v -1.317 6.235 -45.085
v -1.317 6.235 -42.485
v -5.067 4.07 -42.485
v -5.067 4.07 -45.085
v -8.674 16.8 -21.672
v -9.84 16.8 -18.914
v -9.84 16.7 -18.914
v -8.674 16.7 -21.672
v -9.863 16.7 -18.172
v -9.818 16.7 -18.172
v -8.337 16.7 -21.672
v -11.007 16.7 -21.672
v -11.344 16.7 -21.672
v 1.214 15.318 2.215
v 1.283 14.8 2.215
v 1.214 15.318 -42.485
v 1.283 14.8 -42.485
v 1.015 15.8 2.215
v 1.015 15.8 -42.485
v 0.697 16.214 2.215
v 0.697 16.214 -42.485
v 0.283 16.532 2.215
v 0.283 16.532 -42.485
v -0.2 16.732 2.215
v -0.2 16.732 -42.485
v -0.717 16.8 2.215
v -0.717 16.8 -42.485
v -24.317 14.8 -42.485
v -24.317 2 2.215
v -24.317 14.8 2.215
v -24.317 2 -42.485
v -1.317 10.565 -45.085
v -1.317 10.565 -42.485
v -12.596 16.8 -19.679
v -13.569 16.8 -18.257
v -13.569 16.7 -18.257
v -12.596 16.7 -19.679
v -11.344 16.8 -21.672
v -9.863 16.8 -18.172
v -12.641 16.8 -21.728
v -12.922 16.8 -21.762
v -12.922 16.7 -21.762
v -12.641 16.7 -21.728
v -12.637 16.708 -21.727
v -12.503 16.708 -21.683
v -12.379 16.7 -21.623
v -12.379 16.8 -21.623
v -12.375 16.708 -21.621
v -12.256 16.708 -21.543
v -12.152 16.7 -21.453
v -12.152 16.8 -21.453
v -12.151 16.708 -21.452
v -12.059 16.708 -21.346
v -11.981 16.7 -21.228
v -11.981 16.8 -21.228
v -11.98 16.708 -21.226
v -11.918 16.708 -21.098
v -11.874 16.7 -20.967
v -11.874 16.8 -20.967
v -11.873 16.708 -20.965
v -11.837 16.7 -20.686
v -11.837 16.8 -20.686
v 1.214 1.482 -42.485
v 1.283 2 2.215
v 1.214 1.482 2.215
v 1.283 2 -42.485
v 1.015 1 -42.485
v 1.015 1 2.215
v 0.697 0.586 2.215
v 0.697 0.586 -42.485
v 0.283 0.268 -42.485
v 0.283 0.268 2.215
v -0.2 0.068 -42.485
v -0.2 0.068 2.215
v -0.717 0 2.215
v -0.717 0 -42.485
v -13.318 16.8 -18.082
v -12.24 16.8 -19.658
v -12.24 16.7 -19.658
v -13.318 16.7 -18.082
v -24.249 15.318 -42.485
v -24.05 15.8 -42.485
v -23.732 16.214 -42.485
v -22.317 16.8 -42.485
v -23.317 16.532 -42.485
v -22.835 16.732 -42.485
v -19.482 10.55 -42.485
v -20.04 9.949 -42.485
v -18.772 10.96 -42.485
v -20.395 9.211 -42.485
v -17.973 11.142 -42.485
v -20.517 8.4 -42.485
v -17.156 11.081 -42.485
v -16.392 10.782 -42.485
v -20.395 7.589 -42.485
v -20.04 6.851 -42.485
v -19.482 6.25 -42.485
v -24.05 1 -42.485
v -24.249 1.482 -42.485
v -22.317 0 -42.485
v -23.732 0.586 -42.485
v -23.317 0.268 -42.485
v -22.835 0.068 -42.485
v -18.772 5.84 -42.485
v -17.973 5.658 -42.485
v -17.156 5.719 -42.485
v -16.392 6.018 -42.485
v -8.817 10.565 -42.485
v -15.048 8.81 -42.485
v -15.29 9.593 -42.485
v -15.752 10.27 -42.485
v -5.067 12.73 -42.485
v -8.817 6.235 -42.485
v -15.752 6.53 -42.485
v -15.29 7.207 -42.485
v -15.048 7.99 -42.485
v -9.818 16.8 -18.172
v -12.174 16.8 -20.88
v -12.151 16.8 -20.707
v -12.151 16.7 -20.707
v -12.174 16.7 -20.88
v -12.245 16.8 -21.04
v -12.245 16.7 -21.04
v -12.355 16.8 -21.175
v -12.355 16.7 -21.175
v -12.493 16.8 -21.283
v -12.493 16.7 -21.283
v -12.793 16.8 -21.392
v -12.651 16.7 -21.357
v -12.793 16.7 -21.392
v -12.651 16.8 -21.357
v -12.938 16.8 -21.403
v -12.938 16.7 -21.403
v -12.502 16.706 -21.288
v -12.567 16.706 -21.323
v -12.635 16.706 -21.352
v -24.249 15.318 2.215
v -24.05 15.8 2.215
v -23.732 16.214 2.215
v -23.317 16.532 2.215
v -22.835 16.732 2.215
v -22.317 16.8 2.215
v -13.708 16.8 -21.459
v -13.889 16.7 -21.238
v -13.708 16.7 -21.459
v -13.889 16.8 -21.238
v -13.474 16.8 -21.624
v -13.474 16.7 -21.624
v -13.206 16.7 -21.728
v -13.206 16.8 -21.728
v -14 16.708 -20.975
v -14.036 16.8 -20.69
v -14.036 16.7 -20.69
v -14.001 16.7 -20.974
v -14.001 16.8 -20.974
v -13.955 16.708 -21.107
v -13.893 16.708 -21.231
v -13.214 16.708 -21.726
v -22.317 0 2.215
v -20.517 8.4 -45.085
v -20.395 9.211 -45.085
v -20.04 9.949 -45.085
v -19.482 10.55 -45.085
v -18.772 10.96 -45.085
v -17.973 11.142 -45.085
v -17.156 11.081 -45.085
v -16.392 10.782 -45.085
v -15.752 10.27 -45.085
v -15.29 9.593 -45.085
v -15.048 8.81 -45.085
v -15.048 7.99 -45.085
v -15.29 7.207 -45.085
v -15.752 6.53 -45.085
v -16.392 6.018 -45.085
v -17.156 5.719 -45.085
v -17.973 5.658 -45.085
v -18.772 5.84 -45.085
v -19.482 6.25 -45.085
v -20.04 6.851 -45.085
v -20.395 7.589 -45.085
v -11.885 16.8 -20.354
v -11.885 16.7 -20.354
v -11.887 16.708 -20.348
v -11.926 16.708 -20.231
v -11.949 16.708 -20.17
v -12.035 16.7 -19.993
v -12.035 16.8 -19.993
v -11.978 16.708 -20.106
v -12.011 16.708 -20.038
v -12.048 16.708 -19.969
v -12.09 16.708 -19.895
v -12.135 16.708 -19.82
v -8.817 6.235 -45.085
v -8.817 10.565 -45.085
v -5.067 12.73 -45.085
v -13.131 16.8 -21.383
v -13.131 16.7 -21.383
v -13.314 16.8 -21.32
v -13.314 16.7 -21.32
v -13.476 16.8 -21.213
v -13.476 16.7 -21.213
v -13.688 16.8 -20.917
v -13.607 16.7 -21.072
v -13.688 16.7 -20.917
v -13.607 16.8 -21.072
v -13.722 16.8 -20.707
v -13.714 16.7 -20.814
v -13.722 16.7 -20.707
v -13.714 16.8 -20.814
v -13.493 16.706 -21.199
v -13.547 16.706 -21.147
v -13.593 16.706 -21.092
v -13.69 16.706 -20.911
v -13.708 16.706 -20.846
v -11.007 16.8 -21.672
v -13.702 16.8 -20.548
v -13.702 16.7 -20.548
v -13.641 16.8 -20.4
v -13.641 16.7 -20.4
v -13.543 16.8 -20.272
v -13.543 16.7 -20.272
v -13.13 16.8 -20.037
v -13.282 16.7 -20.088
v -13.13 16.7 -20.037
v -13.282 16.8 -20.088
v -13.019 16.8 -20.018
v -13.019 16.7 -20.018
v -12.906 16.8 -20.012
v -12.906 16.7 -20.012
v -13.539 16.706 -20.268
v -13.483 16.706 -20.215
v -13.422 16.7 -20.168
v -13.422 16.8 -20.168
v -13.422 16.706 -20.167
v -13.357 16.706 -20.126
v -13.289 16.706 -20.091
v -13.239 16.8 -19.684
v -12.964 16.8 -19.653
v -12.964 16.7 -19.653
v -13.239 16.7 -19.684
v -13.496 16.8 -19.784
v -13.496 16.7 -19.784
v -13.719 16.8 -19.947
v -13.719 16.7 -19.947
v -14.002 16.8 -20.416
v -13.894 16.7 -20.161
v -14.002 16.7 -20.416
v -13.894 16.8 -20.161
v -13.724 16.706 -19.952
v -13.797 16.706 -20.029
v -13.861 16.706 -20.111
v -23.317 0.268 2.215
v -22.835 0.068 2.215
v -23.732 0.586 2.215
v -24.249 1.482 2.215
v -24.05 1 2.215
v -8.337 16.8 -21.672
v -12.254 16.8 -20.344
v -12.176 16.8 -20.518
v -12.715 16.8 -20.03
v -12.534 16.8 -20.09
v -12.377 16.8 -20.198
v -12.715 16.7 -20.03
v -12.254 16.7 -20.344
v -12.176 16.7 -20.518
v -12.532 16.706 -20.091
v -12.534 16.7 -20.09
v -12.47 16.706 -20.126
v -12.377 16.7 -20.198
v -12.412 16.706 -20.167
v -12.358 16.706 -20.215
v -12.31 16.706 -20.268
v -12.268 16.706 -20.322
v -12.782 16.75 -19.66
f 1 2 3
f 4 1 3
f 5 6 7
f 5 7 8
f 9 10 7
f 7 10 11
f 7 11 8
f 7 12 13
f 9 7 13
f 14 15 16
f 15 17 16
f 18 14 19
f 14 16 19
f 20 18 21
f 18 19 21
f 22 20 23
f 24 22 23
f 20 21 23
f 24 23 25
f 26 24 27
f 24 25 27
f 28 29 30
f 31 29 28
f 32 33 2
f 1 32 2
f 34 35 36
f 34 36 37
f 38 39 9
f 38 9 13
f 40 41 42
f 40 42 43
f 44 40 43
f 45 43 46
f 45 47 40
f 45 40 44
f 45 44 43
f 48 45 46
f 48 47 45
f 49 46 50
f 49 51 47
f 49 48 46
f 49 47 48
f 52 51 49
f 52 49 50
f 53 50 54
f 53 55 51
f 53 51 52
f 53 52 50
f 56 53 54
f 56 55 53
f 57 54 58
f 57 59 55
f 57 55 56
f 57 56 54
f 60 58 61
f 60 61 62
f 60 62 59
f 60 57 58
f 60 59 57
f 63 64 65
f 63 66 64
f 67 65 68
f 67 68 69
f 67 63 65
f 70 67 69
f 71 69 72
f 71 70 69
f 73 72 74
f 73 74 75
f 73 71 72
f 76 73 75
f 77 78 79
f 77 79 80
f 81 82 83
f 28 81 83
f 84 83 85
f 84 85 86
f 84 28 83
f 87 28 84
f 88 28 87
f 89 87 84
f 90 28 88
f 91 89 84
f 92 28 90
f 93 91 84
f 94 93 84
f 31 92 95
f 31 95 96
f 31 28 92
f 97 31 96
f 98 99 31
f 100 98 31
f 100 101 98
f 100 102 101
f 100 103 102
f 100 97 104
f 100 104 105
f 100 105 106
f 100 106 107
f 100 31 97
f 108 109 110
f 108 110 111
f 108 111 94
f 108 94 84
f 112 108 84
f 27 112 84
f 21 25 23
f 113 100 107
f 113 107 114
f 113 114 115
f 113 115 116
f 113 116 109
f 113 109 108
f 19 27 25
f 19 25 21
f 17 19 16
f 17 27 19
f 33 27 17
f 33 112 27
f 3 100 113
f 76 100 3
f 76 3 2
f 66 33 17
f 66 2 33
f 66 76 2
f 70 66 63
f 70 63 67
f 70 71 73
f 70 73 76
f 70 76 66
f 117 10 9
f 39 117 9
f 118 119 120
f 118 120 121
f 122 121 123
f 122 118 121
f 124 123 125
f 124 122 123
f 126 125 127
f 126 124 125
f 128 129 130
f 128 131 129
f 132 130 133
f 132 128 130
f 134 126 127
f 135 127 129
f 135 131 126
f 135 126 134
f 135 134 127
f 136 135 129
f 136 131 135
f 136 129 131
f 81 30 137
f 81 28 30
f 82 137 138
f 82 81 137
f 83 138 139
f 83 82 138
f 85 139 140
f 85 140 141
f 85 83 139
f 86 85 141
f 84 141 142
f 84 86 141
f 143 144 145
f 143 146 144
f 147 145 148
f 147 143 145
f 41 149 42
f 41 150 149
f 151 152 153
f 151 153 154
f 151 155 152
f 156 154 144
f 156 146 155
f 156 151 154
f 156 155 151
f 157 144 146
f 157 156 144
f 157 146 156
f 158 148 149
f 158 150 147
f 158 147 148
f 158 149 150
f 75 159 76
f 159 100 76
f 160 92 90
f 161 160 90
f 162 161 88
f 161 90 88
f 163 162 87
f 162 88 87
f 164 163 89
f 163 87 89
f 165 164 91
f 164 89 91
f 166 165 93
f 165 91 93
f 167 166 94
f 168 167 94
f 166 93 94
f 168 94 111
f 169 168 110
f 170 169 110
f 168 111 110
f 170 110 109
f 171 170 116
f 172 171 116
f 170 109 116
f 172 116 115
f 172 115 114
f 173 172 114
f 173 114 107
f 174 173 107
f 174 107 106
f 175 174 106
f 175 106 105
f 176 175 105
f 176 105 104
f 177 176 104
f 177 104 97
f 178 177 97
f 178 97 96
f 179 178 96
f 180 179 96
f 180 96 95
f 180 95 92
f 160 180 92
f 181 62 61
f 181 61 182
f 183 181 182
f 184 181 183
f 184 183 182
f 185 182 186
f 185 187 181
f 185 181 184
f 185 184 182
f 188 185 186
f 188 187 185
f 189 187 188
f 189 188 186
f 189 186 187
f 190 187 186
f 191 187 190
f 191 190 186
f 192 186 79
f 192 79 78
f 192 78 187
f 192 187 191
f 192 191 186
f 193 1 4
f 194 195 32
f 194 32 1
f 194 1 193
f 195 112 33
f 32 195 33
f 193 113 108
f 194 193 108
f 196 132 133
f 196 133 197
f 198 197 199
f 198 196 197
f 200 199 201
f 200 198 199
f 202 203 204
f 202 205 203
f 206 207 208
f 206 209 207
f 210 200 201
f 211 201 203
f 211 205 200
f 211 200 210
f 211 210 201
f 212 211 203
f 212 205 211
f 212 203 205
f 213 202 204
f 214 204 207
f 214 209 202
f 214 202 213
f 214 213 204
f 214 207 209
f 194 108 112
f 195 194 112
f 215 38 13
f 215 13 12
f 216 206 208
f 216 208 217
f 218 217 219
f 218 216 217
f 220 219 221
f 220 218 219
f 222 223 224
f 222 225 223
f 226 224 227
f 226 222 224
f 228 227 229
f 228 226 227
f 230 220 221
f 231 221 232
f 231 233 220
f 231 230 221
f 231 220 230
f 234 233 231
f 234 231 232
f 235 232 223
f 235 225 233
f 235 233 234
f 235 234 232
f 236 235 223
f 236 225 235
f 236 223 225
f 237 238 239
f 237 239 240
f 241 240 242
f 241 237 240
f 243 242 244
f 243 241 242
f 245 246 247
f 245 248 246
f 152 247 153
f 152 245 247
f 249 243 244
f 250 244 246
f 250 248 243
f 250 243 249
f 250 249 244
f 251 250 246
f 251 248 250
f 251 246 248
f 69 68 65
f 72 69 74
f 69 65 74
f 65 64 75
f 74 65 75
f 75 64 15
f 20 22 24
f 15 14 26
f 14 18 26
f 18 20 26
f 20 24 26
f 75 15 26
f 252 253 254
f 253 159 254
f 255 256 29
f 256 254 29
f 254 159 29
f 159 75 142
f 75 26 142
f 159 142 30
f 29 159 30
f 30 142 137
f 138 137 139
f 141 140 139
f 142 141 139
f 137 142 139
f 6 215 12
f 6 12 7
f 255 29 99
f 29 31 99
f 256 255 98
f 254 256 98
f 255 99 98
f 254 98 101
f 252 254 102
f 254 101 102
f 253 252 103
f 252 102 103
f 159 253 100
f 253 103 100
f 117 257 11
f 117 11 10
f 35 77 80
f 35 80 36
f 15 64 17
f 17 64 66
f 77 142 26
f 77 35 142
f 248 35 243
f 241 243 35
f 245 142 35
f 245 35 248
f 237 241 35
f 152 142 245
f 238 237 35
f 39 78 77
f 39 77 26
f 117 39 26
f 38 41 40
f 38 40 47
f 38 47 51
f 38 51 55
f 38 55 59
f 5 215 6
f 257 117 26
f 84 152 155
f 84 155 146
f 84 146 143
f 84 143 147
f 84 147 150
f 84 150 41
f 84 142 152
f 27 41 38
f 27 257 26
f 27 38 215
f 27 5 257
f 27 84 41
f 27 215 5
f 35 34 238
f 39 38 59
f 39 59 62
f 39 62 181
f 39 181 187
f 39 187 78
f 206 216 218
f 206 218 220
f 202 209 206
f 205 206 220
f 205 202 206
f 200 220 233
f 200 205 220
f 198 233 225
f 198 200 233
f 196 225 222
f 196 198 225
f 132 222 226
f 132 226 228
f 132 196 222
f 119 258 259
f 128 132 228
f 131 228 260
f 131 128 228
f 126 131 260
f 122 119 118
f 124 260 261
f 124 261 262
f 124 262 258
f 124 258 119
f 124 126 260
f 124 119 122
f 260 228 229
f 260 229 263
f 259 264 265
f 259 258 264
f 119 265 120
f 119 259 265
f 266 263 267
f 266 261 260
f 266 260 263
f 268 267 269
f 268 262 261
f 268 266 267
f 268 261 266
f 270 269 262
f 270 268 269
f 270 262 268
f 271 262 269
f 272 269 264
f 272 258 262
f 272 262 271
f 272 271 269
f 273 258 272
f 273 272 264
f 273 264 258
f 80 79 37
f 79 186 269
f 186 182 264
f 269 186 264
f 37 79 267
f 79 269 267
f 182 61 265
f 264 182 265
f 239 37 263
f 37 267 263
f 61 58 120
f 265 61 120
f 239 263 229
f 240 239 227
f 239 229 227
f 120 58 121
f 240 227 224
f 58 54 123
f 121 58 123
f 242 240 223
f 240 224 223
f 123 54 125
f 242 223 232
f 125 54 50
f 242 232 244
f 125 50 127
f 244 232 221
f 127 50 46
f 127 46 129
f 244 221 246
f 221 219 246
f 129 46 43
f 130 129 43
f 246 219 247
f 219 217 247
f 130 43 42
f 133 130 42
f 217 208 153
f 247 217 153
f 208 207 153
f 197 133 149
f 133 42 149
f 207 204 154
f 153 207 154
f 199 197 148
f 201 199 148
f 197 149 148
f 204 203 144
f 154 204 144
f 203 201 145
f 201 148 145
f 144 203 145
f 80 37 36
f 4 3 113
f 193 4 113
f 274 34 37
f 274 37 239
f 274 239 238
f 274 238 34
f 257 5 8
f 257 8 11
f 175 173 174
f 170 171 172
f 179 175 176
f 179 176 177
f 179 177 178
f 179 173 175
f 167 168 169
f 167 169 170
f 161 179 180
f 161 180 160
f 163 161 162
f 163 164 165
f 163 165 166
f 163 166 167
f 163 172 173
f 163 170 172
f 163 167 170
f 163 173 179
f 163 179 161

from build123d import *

# Parameters (mm, degrees)
SKETCH1_W           = 25.6
SKETCH1_H           = 44.7
BOSS_EXTRUDE1_DEPTH = 16.8
FILLET1_R           = 2
BOSS_EXTRUDE2_START = -44.7
SKETCH2_R           = 2.75
BOSS_EXTRUDE2_DEPTH = 47.3
CUT_EXTRUDE1_DEPTH  = 0.1


with BuildPart() as part:
    # Sketch1 → Boss-Extrude1 (new body)
    with BuildSketch(Plane(origin=(0, 0, 0), x_dir=(1, 0, 0), z_dir=(0, 1, 0))):
        with Locations((-11.517488789, 20.134753363)):
            Rectangle(SKETCH1_W, SKETCH1_H)
    extrude(amount=BOSS_EXTRUDE1_DEPTH)

    # Fillet1
    fillet1_edges = [part.edges().sort_by_distance(p)[0] for p in [
        (1.282511211, 16.8, -20.134753363),
        (-24.317488789, 16.8, -20.134753363),
        (1.282511211, 0, -20.134753363),
        (-24.317488789, 0, -20.134753363),
    ]]
    fillet(fillet1_edges, radius=FILLET1_R)

    # Sketch2 → Boss-Extrude2 (add)
    with BuildSketch(Plane(origin=(0, 0, -42.484753363), x_dir=(-1, 0, 0), z_dir=(0, 0, -1)).offset(BOSS_EXTRUDE2_START)):
        with Locations((17.767488789, 8.4)):
            Circle(SKETCH2_R)
        Polygon((5.067488789, 12.730127019), (1.317488789, 10.565063509), (1.317488789, 6.234936491), (5.067488789, 4.069872981), (8.817488789, 6.234936491), (8.817488789, 10.565063509), align=None)
    extrude(amount=BOSS_EXTRUDE2_DEPTH)

    # Sketch3 → Cut-Extrude1 (cut)
    # profile 1 of 2: a face of its own
    with BuildSketch(Plane(origin=(0, 16.8, 0), x_dir=(1, 0, 0), z_dir=(0, 1, 0))):
        with BuildLine():
            Line((-13.318041778, 18.082325539), (-13.569043381, 18.256904866))
            Line((-13.569043381, 18.256904866), (-12.595886329, 19.679480988))
            add(Edge.make_bspline(
                [(-12.595886329, 19.679480988), (-12.657977065, 19.671887924), (-12.780237185, 19.656936759), (-12.903374287, 19.654190105), (-12.963975272, 19.652838359)],
                knots=[0, 0, 0, 0, 1.015715272, 2, 2, 2, 2], degree=3))
            add(Edge.make_bspline(
                [(-12.963975272, 19.652838359), (-13.00071732, 19.653779436), (-13.072838746, 19.655626687), (-13.178870399, 19.670268495), (-13.280755959, 19.692818623), (-13.378225315, 19.726467378), (-13.47164482, 19.768285587), (-13.560810534, 19.8201426), (-13.645602424, 19.881148892), (-13.725109834, 19.950981884), (-13.797421573, 20.027659936), (-13.861844871, 20.108815579), (-13.915386003, 20.19539155), (-13.959862588, 20.285621769), (-13.993593042, 20.38080312), (-14.018155579, 20.47985252), (-14.033277934, 20.583464162), (-14.035077029, 20.653989293), (-14.035990496, 20.689797494)],
                knots=[0, 0, 0, 0, 1.060718605, 2.082097864, 3.085795603, 4.069760067, 5.054557537, 6.03741023, 7.043284206, 8.066802108, 9.088538119, 10.083643548, 11.053783639, 12.022749082, 12.983451788, 13.964007469, 14.966251758, 16, 16, 16, 16], degree=3))
            add(Edge.make_bspline(
                [(-14.035990496, 20.689797494), (-14.034256061, 20.738766147), (-14.030851718, 20.834881678), (-14.0034532, 20.975315447), (-13.958392861, 21.108101991), (-13.895564484, 21.232892185), (-13.816429763, 21.347890924), (-13.721321173, 21.451499533), (-13.610817209, 21.542244387), (-13.487435189, 21.620248464), (-13.354082169, 21.682983462), (-13.214413511, 21.729222762), (-13.069499391, 21.75642151), (-12.97133172, 21.760007371), (-12.921907964, 21.761812718)],
                knots=[0, 0, 0, 0, 1.022988612, 2.007919123, 2.978103895, 3.94594894, 4.918897164, 5.887013414, 6.875921846, 7.89917871, 8.930658928, 9.948724884, 10.967259574, 12, 12, 12, 12], degree=3))
            add(Edge.make_bspline(
                [(-12.921907964, 21.761812718), (-12.873419544, 21.759982555), (-12.777610998, 21.756366326), (-12.636721991, 21.729882357), (-12.501780974, 21.685245684), (-12.373535987, 21.62356112), (-12.254796575, 21.546240212), (-12.148020764, 21.454105689), (-12.055645225, 21.347100161), (-11.977821344, 21.227811671), (-11.915351304, 21.09964469), (-11.870279021, 20.965860768), (-11.842533382, 20.827422046), (-11.839037055, 20.733627572), (-11.837272547, 20.686291885)],
                knots=[0, 0, 0, 0, 1.026385292, 2.028040595, 3.023318987, 4.028184125, 5.03290303, 6.015178782, 7.004435299, 8.016004309, 9.023023918, 10.015172535, 10.998308025, 12, 12, 12, 12], degree=3))
            add(Edge.make_bspline(
                [(-11.837272547, 20.686291885), (-11.838450956, 20.649548118), (-11.840841064, 20.575022577), (-11.857577371, 20.461792234), (-11.885997556, 20.346341005), (-11.918249255, 20.248619409), (-11.949381423, 20.167910959), (-11.978682554, 20.104159379), (-12.011194708, 20.037058116), (-12.049113473, 19.967310778), (-12.08987577, 19.894028243), (-12.135935047, 19.817945527), (-12.186240619, 19.738960534), (-12.222070338, 19.685713446), (-12.240417579, 19.658447334)],
                knots=[0, 0, 0, 0, 1.179839688, 2.393009684, 3.667231171, 4.993948276, 5.694988576, 6.444077775, 7.246288328, 8.089075292, 8.993003841, 9.939041771, 10.944649915, 12, 12, 12, 12], degree=3))
            Line((-12.240417579, 19.658447334), (-13.318041778, 18.082325539))
        make_face()
        with BuildLine():
            add(Edge.make_bspline(
                [(-12.905782163, 20.011812718), (-12.877948149, 20.012573102), (-12.823764786, 20.014053311), (-12.744387487, 20.023062553), (-12.669463283, 20.039036539), (-12.598792034, 20.061956251), (-12.531665132, 20.08961292), (-12.469148804, 20.124824906), (-12.411190728, 20.166841541), (-12.357402801, 20.214051556), (-12.309638802, 20.26650214), (-12.267095771, 20.321399247), (-12.230935204, 20.378983857), (-12.202371926, 20.439977119), (-12.178887351, 20.502894327), (-12.162669339, 20.568748683), (-12.153685006, 20.637197083), (-12.152153431, 20.683695741), (-12.151375111, 20.707325539)],
                knots=[0, 0, 0, 0, 1.163407946, 2.26475976, 3.333800367, 4.359385343, 5.366239384, 6.363380779, 7.350133999, 8.353570782, 9.349036268, 10.310270964, 11.253520213, 12.184142, 13.120487599, 14.056272588, 15.012232024, 16, 16, 16, 16], degree=3))
            add(Edge.make_bspline(
                [(-12.151375111, 20.707325539), (-12.152044781, 20.730965204), (-12.153364446, 20.777550064), (-12.163951746, 20.846099804), (-12.182576969, 20.911793065), (-12.207567453, 20.974989495), (-12.240487691, 21.035169867), (-12.279991177, 21.093089738), (-12.326923627, 21.148381866), (-12.380926193, 21.19974585), (-12.439160746, 21.247093749), (-12.501221246, 21.288879825), (-12.566596162, 21.323901021), (-12.634886652, 21.352799991), (-12.706235001, 21.375351767), (-12.780598989, 21.391569132), (-12.858354395, 21.400540886), (-12.911135681, 21.402062781), (-12.938033765, 21.402838359)],
                knots=[0, 0, 0, 0, 0.972161553, 1.915763587, 2.844109794, 3.775983486, 4.705125789, 5.659731448, 6.655561913, 7.682237399, 8.721216875, 9.739758359, 10.754845918, 11.767244016, 12.7857855, 13.828538656, 14.893392813, 16, 16, 16, 16], degree=3))
            add(Edge.make_bspline(
                [(-12.938033765, 21.402838359), (-12.964697919, 21.402061528), (-13.017012768, 21.40053739), (-13.094076927, 21.391586185), (-13.167938095, 21.375242701), (-13.239079716, 21.352810437), (-13.307368176, 21.323898866), (-13.372740009, 21.28887799), (-13.434815026, 21.247103368), (-13.492993746, 21.199708595), (-13.547091668, 21.148620949), (-13.593217197, 21.09284752), (-13.63281109, 21.035199996), (-13.665686092, 20.974981487), (-13.69068861, 20.911795202), (-13.709310611, 20.846099225), (-13.719898776, 20.777550215), (-13.721218323, 20.730965255), (-13.721887932, 20.707325539)],
                knots=[0, 0, 0, 0, 1.099389452, 2.15699305, 3.192601482, 4.213358962, 5.227959689, 6.245255729, 7.266013209, 8.307253147, 9.336162325, 10.327954924, 11.284637477, 12.215801273, 13.149702402, 14.080068371, 15.025723358, 16, 16, 16, 16], degree=3))
            add(Edge.make_bspline(
                [(-13.721887932, 20.707325539), (-13.721282006, 20.68367734), (-13.720087009, 20.637038764), (-13.708559219, 20.568512371), (-13.689280939, 20.502824177), (-13.663461549, 20.43933547), (-13.629459958, 20.378663612), (-13.58773611, 20.32109625), (-13.538830564, 20.2659808), (-13.483397077, 20.214173588), (-13.422728916, 20.166621412), (-13.35793217, 20.12509103), (-13.290122333, 20.090018586), (-13.219060702, 20.061877202), (-13.145273902, 20.039265539), (-13.068098771, 20.023091993), (-12.987790533, 20.014139727), (-12.933380551, 20.01259583), (-12.905782163, 20.011812718)],
                knots=[0, 0, 0, 0, 0.952633368, 1.87876736, 2.791047057, 3.707742249, 4.635551637, 5.587206343, 6.568248508, 7.601284464, 8.641511608, 9.671105535, 10.699146789, 11.713763218, 12.747829548, 13.806491675, 14.887386225, 16, 16, 16, 16], degree=3))
        make_face(mode=Mode.SUBTRACT)
    # profile 2 of 2: a face of its own
    with BuildSketch(Plane(origin=(0, 16.8, 0), x_dir=(1, 0, 0), z_dir=(0, 1, 0))):
        Polygon((-11.343682804, 21.672069129), (-11.007144342, 21.672069129), (-9.840477676, 18.913855988), (-8.673811009, 21.672069129), (-8.337272547, 21.672069129), (-9.818041778, 18.172069129), (-9.862913573, 18.172069129), align=None)
    extrude(amount=-CUT_EXTRUDE1_DEPTH, mode=Mode.SUBTRACT)


solid = part.part
